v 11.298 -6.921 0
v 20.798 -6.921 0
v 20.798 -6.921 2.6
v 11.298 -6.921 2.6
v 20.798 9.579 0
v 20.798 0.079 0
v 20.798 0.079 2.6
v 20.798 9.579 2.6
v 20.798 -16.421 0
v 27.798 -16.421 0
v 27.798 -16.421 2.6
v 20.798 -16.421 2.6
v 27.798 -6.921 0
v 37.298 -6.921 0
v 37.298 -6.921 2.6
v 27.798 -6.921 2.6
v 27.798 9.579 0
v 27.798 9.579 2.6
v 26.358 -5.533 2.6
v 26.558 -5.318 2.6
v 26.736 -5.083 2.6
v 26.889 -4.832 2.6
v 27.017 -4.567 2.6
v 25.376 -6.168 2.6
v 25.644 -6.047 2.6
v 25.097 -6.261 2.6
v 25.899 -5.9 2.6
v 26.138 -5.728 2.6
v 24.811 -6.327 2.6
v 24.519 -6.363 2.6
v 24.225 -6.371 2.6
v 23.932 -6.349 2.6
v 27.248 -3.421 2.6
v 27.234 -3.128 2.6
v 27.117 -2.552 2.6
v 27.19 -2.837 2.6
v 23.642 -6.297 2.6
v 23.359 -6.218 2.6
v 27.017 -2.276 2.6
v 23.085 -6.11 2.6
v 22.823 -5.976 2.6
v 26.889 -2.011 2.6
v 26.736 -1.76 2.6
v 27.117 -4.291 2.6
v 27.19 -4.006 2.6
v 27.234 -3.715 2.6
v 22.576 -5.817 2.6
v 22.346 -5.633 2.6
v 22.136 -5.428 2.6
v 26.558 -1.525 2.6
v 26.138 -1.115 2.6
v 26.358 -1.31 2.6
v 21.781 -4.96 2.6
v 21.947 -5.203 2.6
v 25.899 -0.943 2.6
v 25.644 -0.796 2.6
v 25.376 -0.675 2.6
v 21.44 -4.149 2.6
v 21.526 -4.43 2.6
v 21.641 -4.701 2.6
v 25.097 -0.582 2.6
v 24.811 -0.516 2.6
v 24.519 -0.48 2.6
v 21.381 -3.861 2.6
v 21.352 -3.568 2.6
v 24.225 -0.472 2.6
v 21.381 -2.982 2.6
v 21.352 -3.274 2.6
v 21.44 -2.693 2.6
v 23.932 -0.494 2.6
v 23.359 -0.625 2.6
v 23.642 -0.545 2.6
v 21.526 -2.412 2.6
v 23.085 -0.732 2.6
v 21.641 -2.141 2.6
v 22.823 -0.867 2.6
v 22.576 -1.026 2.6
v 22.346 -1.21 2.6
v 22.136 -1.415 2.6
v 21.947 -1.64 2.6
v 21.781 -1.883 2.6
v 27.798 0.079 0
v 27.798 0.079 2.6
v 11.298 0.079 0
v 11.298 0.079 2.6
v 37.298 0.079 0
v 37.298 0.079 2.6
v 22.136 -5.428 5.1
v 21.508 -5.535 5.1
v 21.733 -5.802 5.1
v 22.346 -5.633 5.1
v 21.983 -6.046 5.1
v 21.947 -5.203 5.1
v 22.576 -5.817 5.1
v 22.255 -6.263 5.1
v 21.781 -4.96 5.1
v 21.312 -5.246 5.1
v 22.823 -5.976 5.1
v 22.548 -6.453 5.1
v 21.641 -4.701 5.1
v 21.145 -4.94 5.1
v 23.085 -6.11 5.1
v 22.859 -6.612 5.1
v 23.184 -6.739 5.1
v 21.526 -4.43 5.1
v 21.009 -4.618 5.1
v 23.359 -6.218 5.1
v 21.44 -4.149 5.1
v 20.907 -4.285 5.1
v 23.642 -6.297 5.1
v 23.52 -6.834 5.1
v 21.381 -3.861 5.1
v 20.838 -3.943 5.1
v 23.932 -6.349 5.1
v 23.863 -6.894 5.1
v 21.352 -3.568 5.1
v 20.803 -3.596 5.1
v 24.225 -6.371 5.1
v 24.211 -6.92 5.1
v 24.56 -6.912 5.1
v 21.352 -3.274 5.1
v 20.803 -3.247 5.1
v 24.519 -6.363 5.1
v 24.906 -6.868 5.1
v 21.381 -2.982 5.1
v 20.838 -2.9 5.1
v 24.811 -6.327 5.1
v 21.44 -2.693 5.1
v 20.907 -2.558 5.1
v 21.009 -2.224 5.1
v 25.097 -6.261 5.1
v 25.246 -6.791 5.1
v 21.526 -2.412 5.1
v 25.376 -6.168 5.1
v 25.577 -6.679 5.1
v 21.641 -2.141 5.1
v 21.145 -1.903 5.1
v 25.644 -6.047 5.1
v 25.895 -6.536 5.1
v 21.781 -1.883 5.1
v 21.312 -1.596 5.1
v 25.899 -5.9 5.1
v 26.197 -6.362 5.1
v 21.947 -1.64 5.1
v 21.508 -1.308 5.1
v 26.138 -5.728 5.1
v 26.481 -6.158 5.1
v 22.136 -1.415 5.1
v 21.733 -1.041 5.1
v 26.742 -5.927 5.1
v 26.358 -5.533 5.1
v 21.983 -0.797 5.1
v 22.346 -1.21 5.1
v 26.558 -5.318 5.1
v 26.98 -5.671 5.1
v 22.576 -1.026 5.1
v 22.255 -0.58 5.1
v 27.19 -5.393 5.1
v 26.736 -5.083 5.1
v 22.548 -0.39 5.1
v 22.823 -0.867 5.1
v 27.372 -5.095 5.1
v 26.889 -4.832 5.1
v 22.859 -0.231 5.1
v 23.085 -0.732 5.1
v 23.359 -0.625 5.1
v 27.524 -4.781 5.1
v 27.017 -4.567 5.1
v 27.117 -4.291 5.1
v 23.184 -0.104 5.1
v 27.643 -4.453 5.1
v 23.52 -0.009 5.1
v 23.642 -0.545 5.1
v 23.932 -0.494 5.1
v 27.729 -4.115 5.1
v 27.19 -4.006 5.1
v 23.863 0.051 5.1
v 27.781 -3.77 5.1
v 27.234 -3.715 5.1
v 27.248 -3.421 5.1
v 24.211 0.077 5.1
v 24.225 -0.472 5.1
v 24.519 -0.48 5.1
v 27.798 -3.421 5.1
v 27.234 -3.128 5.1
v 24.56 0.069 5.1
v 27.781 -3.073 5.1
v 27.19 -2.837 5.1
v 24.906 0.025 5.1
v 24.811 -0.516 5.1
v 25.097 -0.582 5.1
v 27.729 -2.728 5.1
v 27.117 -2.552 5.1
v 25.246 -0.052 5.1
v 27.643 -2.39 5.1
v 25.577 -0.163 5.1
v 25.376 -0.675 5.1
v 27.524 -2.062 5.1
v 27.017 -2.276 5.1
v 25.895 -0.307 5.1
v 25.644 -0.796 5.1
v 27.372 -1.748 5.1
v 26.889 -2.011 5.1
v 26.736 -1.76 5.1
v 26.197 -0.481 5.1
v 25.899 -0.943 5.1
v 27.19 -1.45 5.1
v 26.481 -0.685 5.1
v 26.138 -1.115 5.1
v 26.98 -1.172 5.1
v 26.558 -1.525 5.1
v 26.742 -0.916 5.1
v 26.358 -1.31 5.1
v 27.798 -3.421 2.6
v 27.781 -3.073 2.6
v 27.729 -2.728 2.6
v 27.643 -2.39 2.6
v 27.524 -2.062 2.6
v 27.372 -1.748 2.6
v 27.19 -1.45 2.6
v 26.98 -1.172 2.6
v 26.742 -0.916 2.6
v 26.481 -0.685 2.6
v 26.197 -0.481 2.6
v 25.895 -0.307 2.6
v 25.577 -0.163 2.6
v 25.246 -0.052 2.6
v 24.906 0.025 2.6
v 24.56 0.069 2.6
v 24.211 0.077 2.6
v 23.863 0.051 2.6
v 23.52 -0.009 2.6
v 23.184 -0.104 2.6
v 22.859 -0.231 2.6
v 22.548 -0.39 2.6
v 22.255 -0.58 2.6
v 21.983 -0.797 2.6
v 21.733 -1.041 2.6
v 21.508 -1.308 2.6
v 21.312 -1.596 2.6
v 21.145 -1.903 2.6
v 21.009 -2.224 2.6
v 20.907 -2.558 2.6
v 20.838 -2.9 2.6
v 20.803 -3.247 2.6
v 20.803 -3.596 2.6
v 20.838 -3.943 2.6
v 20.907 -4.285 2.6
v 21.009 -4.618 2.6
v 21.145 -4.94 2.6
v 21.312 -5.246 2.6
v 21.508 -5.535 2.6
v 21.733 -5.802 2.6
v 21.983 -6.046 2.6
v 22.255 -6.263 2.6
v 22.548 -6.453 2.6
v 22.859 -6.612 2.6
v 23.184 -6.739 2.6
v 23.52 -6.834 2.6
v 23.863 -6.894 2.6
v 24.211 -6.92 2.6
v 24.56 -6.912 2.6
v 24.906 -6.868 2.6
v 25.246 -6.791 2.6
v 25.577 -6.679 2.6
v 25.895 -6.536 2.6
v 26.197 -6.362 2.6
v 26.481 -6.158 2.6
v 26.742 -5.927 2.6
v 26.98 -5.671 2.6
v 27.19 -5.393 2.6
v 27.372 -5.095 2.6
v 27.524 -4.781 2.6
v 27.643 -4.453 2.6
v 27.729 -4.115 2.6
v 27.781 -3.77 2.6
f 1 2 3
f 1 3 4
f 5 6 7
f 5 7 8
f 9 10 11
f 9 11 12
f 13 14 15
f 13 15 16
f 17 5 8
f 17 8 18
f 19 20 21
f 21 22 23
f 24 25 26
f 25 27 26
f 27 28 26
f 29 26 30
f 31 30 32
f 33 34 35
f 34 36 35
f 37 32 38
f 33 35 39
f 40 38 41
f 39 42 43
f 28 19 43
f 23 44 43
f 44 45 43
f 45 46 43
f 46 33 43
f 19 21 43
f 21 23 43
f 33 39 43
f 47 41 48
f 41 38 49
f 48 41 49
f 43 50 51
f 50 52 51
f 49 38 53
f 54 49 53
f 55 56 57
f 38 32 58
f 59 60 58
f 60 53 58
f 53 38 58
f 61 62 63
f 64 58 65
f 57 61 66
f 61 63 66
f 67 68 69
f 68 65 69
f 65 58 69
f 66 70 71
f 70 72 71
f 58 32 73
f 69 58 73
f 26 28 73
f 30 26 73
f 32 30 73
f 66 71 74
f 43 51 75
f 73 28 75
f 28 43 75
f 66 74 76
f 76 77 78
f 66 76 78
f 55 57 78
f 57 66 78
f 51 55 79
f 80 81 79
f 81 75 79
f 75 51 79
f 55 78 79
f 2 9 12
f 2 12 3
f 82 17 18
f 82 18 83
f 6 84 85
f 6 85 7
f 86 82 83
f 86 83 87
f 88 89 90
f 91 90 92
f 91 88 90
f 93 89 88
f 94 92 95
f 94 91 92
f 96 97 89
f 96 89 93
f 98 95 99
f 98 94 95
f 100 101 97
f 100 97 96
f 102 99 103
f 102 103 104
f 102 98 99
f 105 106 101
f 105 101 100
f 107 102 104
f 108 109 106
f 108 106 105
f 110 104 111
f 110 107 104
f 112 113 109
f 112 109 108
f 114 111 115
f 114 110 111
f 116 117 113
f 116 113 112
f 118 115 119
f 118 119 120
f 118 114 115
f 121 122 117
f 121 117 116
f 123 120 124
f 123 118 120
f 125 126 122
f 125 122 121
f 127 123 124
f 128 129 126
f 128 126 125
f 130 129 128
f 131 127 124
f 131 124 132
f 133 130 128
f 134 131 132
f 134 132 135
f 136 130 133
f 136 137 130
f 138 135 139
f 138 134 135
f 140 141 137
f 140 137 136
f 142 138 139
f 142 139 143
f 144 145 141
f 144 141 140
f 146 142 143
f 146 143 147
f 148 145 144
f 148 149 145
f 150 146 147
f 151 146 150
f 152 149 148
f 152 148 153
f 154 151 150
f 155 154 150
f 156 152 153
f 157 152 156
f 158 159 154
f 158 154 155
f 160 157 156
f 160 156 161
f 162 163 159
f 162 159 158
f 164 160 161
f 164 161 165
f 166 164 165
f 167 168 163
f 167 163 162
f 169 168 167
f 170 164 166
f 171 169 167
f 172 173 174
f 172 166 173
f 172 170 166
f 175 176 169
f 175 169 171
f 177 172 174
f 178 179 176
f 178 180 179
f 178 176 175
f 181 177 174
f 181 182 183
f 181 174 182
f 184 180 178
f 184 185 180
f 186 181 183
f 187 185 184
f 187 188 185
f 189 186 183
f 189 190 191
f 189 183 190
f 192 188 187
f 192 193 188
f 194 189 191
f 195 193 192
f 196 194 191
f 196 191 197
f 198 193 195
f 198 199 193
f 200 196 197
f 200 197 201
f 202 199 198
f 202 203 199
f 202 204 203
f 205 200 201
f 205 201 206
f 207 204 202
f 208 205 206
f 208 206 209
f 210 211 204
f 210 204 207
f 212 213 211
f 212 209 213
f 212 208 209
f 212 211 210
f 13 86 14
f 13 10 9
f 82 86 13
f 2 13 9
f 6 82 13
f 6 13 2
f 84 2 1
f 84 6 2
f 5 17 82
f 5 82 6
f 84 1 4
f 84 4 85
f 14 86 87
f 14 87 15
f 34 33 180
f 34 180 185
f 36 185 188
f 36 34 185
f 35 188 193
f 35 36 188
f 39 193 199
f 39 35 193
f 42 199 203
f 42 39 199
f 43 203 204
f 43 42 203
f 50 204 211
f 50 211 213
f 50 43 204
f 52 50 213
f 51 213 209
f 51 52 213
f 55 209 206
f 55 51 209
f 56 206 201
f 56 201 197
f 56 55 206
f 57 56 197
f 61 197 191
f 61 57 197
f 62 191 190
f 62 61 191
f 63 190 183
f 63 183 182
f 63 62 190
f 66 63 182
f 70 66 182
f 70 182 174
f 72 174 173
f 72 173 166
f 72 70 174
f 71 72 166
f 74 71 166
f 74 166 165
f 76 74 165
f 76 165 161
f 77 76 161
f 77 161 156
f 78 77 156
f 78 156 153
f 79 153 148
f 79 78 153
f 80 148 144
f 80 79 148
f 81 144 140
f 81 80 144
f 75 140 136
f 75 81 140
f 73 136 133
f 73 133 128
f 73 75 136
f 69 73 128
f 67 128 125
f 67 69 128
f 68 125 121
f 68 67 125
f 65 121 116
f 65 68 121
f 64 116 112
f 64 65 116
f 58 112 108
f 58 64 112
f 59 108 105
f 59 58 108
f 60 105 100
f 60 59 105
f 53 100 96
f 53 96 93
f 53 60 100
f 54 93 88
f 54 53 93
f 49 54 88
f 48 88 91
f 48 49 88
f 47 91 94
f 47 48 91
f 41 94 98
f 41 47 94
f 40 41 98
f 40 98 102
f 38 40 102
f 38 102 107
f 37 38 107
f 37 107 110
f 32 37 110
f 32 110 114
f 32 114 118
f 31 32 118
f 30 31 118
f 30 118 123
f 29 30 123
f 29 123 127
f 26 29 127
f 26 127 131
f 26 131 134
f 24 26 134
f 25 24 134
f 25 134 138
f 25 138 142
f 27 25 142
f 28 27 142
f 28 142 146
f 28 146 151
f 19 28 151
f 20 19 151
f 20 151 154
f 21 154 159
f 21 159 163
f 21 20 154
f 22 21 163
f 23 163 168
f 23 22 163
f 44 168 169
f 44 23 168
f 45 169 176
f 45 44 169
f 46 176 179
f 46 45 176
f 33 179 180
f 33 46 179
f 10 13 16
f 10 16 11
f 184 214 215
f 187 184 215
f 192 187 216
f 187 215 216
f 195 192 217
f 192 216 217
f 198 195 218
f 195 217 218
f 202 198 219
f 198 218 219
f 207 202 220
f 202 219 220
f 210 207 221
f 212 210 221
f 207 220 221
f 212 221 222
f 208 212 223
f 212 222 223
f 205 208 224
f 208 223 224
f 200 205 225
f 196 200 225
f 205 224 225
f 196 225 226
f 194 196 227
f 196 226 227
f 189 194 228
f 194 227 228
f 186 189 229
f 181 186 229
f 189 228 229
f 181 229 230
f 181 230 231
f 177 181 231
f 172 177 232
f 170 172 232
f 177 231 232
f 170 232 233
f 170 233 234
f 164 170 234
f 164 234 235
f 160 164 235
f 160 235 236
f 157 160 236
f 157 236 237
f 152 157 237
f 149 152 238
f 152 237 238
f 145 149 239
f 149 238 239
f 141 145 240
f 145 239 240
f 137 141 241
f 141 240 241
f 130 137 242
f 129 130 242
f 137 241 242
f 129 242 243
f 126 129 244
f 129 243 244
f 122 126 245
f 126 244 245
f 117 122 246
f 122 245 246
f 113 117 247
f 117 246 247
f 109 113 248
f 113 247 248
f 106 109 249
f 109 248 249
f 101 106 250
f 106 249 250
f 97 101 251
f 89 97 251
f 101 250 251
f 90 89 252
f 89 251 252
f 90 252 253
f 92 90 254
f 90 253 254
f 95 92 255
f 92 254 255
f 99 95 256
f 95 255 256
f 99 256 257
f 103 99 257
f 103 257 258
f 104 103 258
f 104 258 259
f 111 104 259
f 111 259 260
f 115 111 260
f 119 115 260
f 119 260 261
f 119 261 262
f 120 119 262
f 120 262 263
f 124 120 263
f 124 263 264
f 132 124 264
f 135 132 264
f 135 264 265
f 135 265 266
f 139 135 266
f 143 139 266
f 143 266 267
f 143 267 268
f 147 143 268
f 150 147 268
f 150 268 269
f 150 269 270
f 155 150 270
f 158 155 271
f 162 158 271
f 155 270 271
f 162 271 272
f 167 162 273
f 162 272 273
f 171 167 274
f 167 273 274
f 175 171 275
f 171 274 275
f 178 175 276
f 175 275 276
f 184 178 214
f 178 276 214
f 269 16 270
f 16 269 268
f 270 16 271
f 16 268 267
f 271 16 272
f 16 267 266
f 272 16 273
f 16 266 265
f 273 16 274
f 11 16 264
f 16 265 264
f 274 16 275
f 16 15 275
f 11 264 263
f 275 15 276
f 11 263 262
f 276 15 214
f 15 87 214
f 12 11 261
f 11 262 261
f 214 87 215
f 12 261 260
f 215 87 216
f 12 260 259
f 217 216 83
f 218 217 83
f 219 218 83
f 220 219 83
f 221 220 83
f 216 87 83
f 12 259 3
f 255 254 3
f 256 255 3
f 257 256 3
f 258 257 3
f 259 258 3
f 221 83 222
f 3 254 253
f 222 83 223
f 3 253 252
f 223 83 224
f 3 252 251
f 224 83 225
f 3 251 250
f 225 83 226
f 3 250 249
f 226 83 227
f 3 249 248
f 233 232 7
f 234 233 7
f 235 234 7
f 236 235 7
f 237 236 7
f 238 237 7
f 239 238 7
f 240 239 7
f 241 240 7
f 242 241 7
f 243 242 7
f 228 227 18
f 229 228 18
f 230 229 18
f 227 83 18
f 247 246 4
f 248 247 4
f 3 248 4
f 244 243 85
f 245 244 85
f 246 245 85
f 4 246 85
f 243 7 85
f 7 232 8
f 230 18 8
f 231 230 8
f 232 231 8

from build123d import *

# Parameters (mm, degrees)
EXTRUDE_1_DEPTH = 2.6
SKETCH_2_R      = 3.5
SKETCH_2_R_2    = 2.95
EXTRUDE_2_DEPTH = 2.5


with BuildPart() as part:
    # ｽｹｯﾁ1 → ﾎﾞｽ - 押し出し1 (new body)
    with BuildSketch(Plane.XY):
        Polygon((11.29842378, 0.078571429), (20.79842378, 0.078571429), (20.79842378, 9.578571429), (27.79842378, 9.578571429), (27.79842378, 0.078571429), (37.29842378, 0.078571429), (37.29842378, -6.921428571), (27.79842378, -6.921428571), (27.79842378, -16.421428571), (20.79842378, -16.421428571), (20.79842378, -6.921428571), (11.29842378, -6.921428571), align=None)
    extrude(amount=EXTRUDE_1_DEPTH)

    # ｽｹｯﾁ2 → ﾎﾞｽ - 押し出し2 (add)
    with BuildSketch(Plane.XY.offset(2.6)):
        with Locations((24.29842378, -3.421428571)):
            Circle(SKETCH_2_R)
        with Locations((24.29842378, -3.421428571)):
            Circle(SKETCH_2_R_2, mode=Mode.SUBTRACT)
    extrude(amount=EXTRUDE_2_DEPTH)


solid = part.part
